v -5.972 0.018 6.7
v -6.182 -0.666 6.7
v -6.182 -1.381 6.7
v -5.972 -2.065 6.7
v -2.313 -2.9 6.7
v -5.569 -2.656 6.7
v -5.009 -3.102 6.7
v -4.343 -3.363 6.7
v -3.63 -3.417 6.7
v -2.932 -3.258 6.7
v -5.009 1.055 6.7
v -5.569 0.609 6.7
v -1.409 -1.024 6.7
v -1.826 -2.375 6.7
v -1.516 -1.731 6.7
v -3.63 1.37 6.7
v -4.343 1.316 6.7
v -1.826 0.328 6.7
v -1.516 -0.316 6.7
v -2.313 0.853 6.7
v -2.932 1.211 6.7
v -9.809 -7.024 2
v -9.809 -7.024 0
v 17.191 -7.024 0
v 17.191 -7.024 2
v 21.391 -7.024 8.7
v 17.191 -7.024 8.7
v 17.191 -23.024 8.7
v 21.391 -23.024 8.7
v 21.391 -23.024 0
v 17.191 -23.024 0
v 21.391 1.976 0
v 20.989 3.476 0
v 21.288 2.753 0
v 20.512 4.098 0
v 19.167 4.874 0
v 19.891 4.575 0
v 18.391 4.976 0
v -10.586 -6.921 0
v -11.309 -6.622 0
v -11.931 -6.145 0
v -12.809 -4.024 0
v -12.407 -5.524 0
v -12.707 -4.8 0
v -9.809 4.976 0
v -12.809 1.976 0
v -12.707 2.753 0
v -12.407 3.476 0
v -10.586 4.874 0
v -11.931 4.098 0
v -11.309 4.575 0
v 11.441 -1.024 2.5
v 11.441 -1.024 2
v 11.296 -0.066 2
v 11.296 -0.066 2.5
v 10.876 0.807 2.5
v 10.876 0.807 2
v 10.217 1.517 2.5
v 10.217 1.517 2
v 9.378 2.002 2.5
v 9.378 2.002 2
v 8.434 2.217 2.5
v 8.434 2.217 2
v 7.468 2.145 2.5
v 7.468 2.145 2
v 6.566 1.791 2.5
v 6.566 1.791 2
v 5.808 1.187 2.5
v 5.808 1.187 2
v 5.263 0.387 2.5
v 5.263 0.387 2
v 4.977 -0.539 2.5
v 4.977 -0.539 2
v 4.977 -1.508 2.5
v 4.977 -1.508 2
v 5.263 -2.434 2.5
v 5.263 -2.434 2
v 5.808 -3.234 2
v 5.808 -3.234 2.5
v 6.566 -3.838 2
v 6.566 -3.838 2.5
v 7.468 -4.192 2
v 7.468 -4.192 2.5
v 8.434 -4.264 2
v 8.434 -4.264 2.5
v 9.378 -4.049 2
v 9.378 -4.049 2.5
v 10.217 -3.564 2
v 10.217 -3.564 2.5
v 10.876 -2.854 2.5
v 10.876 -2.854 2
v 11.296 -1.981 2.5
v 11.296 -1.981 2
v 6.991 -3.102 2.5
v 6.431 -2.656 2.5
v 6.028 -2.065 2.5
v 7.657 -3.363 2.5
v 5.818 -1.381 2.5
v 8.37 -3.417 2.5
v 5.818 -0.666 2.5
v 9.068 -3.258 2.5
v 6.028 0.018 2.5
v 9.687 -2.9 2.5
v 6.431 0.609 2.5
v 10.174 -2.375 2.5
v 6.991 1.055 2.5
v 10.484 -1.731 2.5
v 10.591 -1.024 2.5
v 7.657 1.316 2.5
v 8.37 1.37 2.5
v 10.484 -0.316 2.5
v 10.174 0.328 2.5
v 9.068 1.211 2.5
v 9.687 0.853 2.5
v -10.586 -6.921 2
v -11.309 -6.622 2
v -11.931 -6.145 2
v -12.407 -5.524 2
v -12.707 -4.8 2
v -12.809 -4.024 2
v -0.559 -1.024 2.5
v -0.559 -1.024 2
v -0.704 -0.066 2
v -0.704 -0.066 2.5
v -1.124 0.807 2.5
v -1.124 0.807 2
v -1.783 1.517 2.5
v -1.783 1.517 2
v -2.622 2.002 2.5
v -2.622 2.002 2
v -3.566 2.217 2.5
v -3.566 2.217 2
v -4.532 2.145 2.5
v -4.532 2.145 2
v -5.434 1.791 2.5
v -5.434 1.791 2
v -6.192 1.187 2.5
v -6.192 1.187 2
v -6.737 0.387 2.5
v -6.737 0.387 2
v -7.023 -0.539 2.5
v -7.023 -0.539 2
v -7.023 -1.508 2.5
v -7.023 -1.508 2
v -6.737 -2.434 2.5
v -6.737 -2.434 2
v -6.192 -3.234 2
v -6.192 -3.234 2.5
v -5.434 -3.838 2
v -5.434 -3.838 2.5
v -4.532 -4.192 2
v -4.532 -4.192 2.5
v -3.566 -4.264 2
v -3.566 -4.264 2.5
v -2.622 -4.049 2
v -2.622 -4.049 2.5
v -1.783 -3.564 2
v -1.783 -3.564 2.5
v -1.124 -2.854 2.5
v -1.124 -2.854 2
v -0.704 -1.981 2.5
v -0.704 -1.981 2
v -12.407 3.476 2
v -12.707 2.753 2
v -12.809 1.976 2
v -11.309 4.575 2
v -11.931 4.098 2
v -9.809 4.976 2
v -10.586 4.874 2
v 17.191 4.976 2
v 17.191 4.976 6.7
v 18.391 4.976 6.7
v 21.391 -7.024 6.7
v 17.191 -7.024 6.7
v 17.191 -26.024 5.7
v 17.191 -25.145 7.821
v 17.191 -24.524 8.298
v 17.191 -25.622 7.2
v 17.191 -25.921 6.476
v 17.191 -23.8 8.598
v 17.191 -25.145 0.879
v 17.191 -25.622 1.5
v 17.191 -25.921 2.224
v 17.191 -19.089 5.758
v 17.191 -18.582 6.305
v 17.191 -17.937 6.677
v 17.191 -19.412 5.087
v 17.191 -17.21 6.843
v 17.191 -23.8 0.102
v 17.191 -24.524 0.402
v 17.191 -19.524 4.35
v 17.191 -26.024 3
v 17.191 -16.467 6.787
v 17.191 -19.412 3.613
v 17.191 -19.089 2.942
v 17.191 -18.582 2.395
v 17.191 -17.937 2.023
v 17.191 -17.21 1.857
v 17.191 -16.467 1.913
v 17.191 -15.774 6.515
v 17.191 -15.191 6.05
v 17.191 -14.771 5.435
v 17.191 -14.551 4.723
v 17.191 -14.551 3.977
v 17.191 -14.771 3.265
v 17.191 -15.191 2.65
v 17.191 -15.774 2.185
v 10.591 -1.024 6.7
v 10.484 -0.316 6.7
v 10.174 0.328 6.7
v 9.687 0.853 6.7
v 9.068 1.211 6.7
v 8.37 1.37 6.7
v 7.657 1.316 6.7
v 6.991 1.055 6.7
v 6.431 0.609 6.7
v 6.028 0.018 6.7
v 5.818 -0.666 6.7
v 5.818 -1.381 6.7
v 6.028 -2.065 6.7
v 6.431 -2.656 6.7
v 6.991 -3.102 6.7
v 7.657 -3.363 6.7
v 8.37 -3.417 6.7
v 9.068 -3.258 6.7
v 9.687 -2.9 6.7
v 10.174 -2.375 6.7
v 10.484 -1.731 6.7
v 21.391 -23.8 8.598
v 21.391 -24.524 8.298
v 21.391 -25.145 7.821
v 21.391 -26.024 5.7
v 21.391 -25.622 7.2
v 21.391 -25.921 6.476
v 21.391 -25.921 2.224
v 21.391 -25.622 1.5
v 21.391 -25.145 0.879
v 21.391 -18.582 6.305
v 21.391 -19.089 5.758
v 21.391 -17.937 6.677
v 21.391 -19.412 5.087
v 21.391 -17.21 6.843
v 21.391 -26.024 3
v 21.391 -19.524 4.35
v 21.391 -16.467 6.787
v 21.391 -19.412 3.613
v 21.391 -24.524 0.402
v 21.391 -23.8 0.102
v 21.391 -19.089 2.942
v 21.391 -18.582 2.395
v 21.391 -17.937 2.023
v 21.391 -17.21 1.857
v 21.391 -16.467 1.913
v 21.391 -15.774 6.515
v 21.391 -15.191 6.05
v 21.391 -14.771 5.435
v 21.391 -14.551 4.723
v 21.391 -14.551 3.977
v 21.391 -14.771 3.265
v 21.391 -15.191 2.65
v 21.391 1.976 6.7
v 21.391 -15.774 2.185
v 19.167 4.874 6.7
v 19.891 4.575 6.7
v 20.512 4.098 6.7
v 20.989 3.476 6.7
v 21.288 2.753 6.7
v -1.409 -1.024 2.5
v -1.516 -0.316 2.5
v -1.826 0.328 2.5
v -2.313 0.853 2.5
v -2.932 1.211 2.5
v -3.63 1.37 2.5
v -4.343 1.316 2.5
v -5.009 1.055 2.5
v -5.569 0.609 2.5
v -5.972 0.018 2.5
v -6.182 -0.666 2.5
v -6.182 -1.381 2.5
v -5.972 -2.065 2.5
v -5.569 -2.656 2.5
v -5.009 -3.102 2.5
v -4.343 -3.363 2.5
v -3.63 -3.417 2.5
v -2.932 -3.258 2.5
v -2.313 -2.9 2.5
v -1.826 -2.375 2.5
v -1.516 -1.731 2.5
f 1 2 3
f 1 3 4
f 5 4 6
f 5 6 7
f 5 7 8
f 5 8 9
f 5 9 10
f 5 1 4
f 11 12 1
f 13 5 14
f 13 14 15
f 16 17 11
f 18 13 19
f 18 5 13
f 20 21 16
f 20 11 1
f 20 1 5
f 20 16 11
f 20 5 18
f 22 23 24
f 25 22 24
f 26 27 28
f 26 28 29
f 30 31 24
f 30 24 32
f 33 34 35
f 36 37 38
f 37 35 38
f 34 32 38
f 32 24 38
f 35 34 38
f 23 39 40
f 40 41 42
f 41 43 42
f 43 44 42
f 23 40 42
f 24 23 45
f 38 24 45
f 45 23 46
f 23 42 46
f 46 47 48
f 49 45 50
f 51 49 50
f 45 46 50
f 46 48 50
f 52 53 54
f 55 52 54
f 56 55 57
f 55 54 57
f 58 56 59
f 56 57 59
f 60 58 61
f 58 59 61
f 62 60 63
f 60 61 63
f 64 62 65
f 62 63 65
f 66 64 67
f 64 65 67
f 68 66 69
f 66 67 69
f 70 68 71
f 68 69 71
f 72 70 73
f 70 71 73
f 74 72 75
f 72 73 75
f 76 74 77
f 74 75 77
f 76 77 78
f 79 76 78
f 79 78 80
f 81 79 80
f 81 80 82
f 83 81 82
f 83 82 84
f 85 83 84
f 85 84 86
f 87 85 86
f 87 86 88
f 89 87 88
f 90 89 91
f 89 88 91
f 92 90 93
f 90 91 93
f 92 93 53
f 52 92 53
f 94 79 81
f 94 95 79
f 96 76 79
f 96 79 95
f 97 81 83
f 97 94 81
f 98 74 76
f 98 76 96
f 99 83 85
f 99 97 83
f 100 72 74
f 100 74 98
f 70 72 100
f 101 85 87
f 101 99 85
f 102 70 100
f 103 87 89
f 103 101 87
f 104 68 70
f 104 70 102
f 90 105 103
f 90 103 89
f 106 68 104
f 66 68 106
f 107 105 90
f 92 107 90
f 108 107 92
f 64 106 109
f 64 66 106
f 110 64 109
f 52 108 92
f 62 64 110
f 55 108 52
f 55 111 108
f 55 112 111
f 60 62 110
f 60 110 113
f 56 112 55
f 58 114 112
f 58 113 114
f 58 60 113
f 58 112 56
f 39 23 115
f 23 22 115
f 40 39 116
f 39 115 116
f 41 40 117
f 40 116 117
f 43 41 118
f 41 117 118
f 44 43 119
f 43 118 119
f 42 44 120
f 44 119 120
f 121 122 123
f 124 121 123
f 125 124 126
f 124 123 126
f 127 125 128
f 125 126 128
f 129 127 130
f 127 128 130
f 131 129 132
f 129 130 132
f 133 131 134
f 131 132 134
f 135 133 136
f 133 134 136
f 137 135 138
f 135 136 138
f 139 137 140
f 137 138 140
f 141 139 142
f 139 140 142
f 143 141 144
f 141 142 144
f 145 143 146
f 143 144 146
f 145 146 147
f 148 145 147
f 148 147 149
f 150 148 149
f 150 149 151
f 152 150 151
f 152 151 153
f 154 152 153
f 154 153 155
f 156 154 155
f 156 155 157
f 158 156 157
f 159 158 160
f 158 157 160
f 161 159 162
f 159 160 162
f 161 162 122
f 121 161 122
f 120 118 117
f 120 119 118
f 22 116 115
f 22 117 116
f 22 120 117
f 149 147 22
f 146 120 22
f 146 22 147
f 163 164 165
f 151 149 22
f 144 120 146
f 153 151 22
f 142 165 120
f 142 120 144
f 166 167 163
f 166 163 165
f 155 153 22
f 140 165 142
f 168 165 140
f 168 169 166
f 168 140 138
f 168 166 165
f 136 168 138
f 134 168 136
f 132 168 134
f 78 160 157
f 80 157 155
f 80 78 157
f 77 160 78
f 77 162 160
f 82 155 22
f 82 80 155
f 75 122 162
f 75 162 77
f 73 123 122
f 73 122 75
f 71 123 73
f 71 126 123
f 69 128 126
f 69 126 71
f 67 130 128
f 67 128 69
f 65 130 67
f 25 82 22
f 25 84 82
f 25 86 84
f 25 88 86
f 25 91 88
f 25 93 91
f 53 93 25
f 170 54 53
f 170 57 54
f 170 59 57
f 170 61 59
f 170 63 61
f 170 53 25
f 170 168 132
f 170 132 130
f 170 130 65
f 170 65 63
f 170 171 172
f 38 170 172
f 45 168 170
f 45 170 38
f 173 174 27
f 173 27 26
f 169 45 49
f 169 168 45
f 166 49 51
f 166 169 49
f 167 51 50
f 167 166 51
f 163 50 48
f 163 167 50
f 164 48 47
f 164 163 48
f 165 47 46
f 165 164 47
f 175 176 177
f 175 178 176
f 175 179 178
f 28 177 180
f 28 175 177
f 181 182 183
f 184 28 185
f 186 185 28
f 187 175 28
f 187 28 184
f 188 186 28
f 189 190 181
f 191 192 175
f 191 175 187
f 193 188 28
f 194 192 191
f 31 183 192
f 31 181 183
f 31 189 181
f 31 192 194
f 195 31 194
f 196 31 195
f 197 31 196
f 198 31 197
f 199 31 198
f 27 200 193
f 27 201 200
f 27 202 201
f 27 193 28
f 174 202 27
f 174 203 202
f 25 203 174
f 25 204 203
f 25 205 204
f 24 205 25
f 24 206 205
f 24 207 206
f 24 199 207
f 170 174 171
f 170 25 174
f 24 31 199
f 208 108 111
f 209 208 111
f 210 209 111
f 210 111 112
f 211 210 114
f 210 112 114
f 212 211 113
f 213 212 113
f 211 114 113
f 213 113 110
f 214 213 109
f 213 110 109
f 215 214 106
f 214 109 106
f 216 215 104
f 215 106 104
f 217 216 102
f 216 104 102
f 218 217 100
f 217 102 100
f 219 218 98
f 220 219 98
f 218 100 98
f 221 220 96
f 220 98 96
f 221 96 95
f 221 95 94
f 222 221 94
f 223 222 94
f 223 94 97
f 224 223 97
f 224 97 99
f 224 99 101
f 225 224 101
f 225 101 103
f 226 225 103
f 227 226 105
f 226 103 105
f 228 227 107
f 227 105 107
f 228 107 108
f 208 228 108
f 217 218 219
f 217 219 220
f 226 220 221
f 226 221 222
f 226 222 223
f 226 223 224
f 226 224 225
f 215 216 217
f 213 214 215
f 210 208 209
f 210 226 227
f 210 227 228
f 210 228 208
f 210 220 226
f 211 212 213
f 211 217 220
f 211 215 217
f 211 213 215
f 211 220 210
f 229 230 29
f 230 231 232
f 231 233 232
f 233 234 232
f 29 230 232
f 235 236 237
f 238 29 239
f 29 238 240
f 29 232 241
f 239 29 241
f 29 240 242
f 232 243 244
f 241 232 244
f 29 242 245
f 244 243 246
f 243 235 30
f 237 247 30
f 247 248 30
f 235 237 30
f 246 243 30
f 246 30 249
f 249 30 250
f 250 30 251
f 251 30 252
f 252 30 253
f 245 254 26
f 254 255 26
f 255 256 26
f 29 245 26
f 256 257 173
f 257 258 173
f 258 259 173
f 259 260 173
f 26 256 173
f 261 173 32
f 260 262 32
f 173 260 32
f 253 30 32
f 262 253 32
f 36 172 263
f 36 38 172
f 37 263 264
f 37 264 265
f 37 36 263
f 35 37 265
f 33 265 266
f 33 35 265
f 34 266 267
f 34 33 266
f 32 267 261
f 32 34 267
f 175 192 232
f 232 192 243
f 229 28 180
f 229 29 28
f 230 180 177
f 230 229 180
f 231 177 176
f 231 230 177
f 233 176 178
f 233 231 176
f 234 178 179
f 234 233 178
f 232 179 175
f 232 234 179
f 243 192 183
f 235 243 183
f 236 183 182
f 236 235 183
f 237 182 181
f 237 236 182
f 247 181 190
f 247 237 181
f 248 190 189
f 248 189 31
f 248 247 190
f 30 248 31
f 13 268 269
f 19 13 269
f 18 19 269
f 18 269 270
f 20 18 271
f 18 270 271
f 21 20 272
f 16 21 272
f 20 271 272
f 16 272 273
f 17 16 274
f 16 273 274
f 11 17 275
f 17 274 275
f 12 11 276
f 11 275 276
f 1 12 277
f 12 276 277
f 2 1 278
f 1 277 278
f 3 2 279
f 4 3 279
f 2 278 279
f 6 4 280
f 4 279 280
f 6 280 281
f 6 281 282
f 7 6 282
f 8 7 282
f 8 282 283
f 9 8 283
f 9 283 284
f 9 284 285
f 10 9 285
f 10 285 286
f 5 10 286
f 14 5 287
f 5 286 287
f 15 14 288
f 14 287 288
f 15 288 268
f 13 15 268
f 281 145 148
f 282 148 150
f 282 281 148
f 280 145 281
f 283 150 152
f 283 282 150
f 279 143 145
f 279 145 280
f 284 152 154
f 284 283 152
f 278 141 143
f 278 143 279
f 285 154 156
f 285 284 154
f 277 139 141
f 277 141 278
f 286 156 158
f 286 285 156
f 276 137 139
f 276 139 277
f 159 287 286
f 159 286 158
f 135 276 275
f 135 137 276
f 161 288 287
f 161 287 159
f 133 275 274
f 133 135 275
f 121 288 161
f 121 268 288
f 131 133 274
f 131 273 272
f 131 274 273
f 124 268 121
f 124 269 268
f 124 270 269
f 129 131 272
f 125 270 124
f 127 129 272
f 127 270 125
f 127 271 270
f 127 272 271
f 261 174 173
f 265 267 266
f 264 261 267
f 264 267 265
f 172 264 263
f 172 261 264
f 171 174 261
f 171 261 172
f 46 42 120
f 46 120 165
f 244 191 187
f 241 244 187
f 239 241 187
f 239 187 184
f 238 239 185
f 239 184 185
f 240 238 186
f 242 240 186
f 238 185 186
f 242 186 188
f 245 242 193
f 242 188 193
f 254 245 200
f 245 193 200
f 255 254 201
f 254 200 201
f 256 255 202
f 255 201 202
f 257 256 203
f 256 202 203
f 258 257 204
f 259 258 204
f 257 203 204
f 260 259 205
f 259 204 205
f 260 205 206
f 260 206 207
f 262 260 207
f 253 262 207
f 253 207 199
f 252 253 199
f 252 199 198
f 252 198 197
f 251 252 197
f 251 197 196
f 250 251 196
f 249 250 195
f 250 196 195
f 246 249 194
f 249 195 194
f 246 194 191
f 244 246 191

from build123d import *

# Parameters (mm, degrees)
ESQUISSE1_W             = 30
ESQUISSE1_H             = 12
BOSS_EXTRU_1_DEPTH      = 2
ESQUISSE2_R             = 3.25
BOSS_EXTRU_2_DEPTH      = 0.5
ESQUISSE3_R             = 2.4
BOSS_EXTRU_3_DEPTH      = 4.2
ESQUISSE6_W             = 6.7
ESQUISSE6_H             = 31
BOSS_EXTRU_4_DEPTH      = 4.2
ESQUISSE8_W             = 4.2
ESQUISSE8_H             = 19
BOSS_EXTRU_5_DEPTH      = 2
ESQUISSE9_R             = 2.5
ENL_V_MAT_EXTRU_1_DEPTH = 4.2
CONG_1_R                = 3


with BuildPart() as part:
    # Esquisse1 → Boss.-Extru.1 (new body)
    with BuildSketch(Plane.XY):
        with Locations((2.190701098, -1.023529412)):
            Rectangle(ESQUISSE1_W, ESQUISSE1_H)
    extrude(amount=BOSS_EXTRU_1_DEPTH)

    # Esquisse2 → Boss.-Extru.2 (add)
    with BuildSketch(Plane.XY.offset(2)):
        with Locations((8.190701098, -1.023529412)):
            Circle(ESQUISSE2_R)
        with Locations((-3.809298902, -1.023529412)):
            Circle(ESQUISSE2_R)
    extrude(amount=BOSS_EXTRU_2_DEPTH)

    # Esquisse3 → Boss.-Extru.3 (add)
    with BuildSketch(Plane.XY.offset(2.5)):
        with Locations((-3.809298902, -1.023529412)):
            Circle(ESQUISSE3_R)
        with Locations((8.190701098, -1.023529412)):
            Circle(ESQUISSE3_R)
    extrude(amount=BOSS_EXTRU_3_DEPTH)

    # Esquisse6 → Boss.-Extru.4 (add)
    with BuildSketch(Plane(origin=(17.190701098, 0, 0), x_dir=(0, 0, -1), z_dir=(1, 0, 0))):
        with Locations((-3.35, -10.523529412)):
            Rectangle(ESQUISSE6_W, ESQUISSE6_H)
    extrude(amount=BOSS_EXTRU_4_DEPTH)

    # Esquisse8 → Boss.-Extru.5 (add)
    with BuildSketch(Plane.XY.offset(6.7)):
        with Locations((19.290701098, -16.523529412)):
            Rectangle(ESQUISSE8_W, ESQUISSE8_H)
    extrude(amount=BOSS_EXTRU_5_DEPTH)

    # Esquisse9 → Enlèv. mat.-Extru.1 (cut)
    with BuildSketch(Plane.ZY.offset(-17.190701098)):
        with Locations(Location((4.35, -17.023529412, 0), (0, 0, 270))):
            Circle(ESQUISSE9_R)
    extrude(amount=-ENL_V_MAT_EXTRU_1_DEPTH, mode=Mode.SUBTRACT)

    # Congé1
    cong_1_edges = [part.edges().sort_by_distance(p)[0] for p in [
        (19.290701098, -26.023529412, 0),
        (21.390701098, 4.976470588, 3.35),
        (19.290701098, -26.023529412, 8.7),
        (-12.809298902, 4.976470588, 1),
        (-12.809298902, -7.023529412, 1),
    ]]
    fillet(cong_1_edges, radius=CONG_1_R)


solid = part.part
